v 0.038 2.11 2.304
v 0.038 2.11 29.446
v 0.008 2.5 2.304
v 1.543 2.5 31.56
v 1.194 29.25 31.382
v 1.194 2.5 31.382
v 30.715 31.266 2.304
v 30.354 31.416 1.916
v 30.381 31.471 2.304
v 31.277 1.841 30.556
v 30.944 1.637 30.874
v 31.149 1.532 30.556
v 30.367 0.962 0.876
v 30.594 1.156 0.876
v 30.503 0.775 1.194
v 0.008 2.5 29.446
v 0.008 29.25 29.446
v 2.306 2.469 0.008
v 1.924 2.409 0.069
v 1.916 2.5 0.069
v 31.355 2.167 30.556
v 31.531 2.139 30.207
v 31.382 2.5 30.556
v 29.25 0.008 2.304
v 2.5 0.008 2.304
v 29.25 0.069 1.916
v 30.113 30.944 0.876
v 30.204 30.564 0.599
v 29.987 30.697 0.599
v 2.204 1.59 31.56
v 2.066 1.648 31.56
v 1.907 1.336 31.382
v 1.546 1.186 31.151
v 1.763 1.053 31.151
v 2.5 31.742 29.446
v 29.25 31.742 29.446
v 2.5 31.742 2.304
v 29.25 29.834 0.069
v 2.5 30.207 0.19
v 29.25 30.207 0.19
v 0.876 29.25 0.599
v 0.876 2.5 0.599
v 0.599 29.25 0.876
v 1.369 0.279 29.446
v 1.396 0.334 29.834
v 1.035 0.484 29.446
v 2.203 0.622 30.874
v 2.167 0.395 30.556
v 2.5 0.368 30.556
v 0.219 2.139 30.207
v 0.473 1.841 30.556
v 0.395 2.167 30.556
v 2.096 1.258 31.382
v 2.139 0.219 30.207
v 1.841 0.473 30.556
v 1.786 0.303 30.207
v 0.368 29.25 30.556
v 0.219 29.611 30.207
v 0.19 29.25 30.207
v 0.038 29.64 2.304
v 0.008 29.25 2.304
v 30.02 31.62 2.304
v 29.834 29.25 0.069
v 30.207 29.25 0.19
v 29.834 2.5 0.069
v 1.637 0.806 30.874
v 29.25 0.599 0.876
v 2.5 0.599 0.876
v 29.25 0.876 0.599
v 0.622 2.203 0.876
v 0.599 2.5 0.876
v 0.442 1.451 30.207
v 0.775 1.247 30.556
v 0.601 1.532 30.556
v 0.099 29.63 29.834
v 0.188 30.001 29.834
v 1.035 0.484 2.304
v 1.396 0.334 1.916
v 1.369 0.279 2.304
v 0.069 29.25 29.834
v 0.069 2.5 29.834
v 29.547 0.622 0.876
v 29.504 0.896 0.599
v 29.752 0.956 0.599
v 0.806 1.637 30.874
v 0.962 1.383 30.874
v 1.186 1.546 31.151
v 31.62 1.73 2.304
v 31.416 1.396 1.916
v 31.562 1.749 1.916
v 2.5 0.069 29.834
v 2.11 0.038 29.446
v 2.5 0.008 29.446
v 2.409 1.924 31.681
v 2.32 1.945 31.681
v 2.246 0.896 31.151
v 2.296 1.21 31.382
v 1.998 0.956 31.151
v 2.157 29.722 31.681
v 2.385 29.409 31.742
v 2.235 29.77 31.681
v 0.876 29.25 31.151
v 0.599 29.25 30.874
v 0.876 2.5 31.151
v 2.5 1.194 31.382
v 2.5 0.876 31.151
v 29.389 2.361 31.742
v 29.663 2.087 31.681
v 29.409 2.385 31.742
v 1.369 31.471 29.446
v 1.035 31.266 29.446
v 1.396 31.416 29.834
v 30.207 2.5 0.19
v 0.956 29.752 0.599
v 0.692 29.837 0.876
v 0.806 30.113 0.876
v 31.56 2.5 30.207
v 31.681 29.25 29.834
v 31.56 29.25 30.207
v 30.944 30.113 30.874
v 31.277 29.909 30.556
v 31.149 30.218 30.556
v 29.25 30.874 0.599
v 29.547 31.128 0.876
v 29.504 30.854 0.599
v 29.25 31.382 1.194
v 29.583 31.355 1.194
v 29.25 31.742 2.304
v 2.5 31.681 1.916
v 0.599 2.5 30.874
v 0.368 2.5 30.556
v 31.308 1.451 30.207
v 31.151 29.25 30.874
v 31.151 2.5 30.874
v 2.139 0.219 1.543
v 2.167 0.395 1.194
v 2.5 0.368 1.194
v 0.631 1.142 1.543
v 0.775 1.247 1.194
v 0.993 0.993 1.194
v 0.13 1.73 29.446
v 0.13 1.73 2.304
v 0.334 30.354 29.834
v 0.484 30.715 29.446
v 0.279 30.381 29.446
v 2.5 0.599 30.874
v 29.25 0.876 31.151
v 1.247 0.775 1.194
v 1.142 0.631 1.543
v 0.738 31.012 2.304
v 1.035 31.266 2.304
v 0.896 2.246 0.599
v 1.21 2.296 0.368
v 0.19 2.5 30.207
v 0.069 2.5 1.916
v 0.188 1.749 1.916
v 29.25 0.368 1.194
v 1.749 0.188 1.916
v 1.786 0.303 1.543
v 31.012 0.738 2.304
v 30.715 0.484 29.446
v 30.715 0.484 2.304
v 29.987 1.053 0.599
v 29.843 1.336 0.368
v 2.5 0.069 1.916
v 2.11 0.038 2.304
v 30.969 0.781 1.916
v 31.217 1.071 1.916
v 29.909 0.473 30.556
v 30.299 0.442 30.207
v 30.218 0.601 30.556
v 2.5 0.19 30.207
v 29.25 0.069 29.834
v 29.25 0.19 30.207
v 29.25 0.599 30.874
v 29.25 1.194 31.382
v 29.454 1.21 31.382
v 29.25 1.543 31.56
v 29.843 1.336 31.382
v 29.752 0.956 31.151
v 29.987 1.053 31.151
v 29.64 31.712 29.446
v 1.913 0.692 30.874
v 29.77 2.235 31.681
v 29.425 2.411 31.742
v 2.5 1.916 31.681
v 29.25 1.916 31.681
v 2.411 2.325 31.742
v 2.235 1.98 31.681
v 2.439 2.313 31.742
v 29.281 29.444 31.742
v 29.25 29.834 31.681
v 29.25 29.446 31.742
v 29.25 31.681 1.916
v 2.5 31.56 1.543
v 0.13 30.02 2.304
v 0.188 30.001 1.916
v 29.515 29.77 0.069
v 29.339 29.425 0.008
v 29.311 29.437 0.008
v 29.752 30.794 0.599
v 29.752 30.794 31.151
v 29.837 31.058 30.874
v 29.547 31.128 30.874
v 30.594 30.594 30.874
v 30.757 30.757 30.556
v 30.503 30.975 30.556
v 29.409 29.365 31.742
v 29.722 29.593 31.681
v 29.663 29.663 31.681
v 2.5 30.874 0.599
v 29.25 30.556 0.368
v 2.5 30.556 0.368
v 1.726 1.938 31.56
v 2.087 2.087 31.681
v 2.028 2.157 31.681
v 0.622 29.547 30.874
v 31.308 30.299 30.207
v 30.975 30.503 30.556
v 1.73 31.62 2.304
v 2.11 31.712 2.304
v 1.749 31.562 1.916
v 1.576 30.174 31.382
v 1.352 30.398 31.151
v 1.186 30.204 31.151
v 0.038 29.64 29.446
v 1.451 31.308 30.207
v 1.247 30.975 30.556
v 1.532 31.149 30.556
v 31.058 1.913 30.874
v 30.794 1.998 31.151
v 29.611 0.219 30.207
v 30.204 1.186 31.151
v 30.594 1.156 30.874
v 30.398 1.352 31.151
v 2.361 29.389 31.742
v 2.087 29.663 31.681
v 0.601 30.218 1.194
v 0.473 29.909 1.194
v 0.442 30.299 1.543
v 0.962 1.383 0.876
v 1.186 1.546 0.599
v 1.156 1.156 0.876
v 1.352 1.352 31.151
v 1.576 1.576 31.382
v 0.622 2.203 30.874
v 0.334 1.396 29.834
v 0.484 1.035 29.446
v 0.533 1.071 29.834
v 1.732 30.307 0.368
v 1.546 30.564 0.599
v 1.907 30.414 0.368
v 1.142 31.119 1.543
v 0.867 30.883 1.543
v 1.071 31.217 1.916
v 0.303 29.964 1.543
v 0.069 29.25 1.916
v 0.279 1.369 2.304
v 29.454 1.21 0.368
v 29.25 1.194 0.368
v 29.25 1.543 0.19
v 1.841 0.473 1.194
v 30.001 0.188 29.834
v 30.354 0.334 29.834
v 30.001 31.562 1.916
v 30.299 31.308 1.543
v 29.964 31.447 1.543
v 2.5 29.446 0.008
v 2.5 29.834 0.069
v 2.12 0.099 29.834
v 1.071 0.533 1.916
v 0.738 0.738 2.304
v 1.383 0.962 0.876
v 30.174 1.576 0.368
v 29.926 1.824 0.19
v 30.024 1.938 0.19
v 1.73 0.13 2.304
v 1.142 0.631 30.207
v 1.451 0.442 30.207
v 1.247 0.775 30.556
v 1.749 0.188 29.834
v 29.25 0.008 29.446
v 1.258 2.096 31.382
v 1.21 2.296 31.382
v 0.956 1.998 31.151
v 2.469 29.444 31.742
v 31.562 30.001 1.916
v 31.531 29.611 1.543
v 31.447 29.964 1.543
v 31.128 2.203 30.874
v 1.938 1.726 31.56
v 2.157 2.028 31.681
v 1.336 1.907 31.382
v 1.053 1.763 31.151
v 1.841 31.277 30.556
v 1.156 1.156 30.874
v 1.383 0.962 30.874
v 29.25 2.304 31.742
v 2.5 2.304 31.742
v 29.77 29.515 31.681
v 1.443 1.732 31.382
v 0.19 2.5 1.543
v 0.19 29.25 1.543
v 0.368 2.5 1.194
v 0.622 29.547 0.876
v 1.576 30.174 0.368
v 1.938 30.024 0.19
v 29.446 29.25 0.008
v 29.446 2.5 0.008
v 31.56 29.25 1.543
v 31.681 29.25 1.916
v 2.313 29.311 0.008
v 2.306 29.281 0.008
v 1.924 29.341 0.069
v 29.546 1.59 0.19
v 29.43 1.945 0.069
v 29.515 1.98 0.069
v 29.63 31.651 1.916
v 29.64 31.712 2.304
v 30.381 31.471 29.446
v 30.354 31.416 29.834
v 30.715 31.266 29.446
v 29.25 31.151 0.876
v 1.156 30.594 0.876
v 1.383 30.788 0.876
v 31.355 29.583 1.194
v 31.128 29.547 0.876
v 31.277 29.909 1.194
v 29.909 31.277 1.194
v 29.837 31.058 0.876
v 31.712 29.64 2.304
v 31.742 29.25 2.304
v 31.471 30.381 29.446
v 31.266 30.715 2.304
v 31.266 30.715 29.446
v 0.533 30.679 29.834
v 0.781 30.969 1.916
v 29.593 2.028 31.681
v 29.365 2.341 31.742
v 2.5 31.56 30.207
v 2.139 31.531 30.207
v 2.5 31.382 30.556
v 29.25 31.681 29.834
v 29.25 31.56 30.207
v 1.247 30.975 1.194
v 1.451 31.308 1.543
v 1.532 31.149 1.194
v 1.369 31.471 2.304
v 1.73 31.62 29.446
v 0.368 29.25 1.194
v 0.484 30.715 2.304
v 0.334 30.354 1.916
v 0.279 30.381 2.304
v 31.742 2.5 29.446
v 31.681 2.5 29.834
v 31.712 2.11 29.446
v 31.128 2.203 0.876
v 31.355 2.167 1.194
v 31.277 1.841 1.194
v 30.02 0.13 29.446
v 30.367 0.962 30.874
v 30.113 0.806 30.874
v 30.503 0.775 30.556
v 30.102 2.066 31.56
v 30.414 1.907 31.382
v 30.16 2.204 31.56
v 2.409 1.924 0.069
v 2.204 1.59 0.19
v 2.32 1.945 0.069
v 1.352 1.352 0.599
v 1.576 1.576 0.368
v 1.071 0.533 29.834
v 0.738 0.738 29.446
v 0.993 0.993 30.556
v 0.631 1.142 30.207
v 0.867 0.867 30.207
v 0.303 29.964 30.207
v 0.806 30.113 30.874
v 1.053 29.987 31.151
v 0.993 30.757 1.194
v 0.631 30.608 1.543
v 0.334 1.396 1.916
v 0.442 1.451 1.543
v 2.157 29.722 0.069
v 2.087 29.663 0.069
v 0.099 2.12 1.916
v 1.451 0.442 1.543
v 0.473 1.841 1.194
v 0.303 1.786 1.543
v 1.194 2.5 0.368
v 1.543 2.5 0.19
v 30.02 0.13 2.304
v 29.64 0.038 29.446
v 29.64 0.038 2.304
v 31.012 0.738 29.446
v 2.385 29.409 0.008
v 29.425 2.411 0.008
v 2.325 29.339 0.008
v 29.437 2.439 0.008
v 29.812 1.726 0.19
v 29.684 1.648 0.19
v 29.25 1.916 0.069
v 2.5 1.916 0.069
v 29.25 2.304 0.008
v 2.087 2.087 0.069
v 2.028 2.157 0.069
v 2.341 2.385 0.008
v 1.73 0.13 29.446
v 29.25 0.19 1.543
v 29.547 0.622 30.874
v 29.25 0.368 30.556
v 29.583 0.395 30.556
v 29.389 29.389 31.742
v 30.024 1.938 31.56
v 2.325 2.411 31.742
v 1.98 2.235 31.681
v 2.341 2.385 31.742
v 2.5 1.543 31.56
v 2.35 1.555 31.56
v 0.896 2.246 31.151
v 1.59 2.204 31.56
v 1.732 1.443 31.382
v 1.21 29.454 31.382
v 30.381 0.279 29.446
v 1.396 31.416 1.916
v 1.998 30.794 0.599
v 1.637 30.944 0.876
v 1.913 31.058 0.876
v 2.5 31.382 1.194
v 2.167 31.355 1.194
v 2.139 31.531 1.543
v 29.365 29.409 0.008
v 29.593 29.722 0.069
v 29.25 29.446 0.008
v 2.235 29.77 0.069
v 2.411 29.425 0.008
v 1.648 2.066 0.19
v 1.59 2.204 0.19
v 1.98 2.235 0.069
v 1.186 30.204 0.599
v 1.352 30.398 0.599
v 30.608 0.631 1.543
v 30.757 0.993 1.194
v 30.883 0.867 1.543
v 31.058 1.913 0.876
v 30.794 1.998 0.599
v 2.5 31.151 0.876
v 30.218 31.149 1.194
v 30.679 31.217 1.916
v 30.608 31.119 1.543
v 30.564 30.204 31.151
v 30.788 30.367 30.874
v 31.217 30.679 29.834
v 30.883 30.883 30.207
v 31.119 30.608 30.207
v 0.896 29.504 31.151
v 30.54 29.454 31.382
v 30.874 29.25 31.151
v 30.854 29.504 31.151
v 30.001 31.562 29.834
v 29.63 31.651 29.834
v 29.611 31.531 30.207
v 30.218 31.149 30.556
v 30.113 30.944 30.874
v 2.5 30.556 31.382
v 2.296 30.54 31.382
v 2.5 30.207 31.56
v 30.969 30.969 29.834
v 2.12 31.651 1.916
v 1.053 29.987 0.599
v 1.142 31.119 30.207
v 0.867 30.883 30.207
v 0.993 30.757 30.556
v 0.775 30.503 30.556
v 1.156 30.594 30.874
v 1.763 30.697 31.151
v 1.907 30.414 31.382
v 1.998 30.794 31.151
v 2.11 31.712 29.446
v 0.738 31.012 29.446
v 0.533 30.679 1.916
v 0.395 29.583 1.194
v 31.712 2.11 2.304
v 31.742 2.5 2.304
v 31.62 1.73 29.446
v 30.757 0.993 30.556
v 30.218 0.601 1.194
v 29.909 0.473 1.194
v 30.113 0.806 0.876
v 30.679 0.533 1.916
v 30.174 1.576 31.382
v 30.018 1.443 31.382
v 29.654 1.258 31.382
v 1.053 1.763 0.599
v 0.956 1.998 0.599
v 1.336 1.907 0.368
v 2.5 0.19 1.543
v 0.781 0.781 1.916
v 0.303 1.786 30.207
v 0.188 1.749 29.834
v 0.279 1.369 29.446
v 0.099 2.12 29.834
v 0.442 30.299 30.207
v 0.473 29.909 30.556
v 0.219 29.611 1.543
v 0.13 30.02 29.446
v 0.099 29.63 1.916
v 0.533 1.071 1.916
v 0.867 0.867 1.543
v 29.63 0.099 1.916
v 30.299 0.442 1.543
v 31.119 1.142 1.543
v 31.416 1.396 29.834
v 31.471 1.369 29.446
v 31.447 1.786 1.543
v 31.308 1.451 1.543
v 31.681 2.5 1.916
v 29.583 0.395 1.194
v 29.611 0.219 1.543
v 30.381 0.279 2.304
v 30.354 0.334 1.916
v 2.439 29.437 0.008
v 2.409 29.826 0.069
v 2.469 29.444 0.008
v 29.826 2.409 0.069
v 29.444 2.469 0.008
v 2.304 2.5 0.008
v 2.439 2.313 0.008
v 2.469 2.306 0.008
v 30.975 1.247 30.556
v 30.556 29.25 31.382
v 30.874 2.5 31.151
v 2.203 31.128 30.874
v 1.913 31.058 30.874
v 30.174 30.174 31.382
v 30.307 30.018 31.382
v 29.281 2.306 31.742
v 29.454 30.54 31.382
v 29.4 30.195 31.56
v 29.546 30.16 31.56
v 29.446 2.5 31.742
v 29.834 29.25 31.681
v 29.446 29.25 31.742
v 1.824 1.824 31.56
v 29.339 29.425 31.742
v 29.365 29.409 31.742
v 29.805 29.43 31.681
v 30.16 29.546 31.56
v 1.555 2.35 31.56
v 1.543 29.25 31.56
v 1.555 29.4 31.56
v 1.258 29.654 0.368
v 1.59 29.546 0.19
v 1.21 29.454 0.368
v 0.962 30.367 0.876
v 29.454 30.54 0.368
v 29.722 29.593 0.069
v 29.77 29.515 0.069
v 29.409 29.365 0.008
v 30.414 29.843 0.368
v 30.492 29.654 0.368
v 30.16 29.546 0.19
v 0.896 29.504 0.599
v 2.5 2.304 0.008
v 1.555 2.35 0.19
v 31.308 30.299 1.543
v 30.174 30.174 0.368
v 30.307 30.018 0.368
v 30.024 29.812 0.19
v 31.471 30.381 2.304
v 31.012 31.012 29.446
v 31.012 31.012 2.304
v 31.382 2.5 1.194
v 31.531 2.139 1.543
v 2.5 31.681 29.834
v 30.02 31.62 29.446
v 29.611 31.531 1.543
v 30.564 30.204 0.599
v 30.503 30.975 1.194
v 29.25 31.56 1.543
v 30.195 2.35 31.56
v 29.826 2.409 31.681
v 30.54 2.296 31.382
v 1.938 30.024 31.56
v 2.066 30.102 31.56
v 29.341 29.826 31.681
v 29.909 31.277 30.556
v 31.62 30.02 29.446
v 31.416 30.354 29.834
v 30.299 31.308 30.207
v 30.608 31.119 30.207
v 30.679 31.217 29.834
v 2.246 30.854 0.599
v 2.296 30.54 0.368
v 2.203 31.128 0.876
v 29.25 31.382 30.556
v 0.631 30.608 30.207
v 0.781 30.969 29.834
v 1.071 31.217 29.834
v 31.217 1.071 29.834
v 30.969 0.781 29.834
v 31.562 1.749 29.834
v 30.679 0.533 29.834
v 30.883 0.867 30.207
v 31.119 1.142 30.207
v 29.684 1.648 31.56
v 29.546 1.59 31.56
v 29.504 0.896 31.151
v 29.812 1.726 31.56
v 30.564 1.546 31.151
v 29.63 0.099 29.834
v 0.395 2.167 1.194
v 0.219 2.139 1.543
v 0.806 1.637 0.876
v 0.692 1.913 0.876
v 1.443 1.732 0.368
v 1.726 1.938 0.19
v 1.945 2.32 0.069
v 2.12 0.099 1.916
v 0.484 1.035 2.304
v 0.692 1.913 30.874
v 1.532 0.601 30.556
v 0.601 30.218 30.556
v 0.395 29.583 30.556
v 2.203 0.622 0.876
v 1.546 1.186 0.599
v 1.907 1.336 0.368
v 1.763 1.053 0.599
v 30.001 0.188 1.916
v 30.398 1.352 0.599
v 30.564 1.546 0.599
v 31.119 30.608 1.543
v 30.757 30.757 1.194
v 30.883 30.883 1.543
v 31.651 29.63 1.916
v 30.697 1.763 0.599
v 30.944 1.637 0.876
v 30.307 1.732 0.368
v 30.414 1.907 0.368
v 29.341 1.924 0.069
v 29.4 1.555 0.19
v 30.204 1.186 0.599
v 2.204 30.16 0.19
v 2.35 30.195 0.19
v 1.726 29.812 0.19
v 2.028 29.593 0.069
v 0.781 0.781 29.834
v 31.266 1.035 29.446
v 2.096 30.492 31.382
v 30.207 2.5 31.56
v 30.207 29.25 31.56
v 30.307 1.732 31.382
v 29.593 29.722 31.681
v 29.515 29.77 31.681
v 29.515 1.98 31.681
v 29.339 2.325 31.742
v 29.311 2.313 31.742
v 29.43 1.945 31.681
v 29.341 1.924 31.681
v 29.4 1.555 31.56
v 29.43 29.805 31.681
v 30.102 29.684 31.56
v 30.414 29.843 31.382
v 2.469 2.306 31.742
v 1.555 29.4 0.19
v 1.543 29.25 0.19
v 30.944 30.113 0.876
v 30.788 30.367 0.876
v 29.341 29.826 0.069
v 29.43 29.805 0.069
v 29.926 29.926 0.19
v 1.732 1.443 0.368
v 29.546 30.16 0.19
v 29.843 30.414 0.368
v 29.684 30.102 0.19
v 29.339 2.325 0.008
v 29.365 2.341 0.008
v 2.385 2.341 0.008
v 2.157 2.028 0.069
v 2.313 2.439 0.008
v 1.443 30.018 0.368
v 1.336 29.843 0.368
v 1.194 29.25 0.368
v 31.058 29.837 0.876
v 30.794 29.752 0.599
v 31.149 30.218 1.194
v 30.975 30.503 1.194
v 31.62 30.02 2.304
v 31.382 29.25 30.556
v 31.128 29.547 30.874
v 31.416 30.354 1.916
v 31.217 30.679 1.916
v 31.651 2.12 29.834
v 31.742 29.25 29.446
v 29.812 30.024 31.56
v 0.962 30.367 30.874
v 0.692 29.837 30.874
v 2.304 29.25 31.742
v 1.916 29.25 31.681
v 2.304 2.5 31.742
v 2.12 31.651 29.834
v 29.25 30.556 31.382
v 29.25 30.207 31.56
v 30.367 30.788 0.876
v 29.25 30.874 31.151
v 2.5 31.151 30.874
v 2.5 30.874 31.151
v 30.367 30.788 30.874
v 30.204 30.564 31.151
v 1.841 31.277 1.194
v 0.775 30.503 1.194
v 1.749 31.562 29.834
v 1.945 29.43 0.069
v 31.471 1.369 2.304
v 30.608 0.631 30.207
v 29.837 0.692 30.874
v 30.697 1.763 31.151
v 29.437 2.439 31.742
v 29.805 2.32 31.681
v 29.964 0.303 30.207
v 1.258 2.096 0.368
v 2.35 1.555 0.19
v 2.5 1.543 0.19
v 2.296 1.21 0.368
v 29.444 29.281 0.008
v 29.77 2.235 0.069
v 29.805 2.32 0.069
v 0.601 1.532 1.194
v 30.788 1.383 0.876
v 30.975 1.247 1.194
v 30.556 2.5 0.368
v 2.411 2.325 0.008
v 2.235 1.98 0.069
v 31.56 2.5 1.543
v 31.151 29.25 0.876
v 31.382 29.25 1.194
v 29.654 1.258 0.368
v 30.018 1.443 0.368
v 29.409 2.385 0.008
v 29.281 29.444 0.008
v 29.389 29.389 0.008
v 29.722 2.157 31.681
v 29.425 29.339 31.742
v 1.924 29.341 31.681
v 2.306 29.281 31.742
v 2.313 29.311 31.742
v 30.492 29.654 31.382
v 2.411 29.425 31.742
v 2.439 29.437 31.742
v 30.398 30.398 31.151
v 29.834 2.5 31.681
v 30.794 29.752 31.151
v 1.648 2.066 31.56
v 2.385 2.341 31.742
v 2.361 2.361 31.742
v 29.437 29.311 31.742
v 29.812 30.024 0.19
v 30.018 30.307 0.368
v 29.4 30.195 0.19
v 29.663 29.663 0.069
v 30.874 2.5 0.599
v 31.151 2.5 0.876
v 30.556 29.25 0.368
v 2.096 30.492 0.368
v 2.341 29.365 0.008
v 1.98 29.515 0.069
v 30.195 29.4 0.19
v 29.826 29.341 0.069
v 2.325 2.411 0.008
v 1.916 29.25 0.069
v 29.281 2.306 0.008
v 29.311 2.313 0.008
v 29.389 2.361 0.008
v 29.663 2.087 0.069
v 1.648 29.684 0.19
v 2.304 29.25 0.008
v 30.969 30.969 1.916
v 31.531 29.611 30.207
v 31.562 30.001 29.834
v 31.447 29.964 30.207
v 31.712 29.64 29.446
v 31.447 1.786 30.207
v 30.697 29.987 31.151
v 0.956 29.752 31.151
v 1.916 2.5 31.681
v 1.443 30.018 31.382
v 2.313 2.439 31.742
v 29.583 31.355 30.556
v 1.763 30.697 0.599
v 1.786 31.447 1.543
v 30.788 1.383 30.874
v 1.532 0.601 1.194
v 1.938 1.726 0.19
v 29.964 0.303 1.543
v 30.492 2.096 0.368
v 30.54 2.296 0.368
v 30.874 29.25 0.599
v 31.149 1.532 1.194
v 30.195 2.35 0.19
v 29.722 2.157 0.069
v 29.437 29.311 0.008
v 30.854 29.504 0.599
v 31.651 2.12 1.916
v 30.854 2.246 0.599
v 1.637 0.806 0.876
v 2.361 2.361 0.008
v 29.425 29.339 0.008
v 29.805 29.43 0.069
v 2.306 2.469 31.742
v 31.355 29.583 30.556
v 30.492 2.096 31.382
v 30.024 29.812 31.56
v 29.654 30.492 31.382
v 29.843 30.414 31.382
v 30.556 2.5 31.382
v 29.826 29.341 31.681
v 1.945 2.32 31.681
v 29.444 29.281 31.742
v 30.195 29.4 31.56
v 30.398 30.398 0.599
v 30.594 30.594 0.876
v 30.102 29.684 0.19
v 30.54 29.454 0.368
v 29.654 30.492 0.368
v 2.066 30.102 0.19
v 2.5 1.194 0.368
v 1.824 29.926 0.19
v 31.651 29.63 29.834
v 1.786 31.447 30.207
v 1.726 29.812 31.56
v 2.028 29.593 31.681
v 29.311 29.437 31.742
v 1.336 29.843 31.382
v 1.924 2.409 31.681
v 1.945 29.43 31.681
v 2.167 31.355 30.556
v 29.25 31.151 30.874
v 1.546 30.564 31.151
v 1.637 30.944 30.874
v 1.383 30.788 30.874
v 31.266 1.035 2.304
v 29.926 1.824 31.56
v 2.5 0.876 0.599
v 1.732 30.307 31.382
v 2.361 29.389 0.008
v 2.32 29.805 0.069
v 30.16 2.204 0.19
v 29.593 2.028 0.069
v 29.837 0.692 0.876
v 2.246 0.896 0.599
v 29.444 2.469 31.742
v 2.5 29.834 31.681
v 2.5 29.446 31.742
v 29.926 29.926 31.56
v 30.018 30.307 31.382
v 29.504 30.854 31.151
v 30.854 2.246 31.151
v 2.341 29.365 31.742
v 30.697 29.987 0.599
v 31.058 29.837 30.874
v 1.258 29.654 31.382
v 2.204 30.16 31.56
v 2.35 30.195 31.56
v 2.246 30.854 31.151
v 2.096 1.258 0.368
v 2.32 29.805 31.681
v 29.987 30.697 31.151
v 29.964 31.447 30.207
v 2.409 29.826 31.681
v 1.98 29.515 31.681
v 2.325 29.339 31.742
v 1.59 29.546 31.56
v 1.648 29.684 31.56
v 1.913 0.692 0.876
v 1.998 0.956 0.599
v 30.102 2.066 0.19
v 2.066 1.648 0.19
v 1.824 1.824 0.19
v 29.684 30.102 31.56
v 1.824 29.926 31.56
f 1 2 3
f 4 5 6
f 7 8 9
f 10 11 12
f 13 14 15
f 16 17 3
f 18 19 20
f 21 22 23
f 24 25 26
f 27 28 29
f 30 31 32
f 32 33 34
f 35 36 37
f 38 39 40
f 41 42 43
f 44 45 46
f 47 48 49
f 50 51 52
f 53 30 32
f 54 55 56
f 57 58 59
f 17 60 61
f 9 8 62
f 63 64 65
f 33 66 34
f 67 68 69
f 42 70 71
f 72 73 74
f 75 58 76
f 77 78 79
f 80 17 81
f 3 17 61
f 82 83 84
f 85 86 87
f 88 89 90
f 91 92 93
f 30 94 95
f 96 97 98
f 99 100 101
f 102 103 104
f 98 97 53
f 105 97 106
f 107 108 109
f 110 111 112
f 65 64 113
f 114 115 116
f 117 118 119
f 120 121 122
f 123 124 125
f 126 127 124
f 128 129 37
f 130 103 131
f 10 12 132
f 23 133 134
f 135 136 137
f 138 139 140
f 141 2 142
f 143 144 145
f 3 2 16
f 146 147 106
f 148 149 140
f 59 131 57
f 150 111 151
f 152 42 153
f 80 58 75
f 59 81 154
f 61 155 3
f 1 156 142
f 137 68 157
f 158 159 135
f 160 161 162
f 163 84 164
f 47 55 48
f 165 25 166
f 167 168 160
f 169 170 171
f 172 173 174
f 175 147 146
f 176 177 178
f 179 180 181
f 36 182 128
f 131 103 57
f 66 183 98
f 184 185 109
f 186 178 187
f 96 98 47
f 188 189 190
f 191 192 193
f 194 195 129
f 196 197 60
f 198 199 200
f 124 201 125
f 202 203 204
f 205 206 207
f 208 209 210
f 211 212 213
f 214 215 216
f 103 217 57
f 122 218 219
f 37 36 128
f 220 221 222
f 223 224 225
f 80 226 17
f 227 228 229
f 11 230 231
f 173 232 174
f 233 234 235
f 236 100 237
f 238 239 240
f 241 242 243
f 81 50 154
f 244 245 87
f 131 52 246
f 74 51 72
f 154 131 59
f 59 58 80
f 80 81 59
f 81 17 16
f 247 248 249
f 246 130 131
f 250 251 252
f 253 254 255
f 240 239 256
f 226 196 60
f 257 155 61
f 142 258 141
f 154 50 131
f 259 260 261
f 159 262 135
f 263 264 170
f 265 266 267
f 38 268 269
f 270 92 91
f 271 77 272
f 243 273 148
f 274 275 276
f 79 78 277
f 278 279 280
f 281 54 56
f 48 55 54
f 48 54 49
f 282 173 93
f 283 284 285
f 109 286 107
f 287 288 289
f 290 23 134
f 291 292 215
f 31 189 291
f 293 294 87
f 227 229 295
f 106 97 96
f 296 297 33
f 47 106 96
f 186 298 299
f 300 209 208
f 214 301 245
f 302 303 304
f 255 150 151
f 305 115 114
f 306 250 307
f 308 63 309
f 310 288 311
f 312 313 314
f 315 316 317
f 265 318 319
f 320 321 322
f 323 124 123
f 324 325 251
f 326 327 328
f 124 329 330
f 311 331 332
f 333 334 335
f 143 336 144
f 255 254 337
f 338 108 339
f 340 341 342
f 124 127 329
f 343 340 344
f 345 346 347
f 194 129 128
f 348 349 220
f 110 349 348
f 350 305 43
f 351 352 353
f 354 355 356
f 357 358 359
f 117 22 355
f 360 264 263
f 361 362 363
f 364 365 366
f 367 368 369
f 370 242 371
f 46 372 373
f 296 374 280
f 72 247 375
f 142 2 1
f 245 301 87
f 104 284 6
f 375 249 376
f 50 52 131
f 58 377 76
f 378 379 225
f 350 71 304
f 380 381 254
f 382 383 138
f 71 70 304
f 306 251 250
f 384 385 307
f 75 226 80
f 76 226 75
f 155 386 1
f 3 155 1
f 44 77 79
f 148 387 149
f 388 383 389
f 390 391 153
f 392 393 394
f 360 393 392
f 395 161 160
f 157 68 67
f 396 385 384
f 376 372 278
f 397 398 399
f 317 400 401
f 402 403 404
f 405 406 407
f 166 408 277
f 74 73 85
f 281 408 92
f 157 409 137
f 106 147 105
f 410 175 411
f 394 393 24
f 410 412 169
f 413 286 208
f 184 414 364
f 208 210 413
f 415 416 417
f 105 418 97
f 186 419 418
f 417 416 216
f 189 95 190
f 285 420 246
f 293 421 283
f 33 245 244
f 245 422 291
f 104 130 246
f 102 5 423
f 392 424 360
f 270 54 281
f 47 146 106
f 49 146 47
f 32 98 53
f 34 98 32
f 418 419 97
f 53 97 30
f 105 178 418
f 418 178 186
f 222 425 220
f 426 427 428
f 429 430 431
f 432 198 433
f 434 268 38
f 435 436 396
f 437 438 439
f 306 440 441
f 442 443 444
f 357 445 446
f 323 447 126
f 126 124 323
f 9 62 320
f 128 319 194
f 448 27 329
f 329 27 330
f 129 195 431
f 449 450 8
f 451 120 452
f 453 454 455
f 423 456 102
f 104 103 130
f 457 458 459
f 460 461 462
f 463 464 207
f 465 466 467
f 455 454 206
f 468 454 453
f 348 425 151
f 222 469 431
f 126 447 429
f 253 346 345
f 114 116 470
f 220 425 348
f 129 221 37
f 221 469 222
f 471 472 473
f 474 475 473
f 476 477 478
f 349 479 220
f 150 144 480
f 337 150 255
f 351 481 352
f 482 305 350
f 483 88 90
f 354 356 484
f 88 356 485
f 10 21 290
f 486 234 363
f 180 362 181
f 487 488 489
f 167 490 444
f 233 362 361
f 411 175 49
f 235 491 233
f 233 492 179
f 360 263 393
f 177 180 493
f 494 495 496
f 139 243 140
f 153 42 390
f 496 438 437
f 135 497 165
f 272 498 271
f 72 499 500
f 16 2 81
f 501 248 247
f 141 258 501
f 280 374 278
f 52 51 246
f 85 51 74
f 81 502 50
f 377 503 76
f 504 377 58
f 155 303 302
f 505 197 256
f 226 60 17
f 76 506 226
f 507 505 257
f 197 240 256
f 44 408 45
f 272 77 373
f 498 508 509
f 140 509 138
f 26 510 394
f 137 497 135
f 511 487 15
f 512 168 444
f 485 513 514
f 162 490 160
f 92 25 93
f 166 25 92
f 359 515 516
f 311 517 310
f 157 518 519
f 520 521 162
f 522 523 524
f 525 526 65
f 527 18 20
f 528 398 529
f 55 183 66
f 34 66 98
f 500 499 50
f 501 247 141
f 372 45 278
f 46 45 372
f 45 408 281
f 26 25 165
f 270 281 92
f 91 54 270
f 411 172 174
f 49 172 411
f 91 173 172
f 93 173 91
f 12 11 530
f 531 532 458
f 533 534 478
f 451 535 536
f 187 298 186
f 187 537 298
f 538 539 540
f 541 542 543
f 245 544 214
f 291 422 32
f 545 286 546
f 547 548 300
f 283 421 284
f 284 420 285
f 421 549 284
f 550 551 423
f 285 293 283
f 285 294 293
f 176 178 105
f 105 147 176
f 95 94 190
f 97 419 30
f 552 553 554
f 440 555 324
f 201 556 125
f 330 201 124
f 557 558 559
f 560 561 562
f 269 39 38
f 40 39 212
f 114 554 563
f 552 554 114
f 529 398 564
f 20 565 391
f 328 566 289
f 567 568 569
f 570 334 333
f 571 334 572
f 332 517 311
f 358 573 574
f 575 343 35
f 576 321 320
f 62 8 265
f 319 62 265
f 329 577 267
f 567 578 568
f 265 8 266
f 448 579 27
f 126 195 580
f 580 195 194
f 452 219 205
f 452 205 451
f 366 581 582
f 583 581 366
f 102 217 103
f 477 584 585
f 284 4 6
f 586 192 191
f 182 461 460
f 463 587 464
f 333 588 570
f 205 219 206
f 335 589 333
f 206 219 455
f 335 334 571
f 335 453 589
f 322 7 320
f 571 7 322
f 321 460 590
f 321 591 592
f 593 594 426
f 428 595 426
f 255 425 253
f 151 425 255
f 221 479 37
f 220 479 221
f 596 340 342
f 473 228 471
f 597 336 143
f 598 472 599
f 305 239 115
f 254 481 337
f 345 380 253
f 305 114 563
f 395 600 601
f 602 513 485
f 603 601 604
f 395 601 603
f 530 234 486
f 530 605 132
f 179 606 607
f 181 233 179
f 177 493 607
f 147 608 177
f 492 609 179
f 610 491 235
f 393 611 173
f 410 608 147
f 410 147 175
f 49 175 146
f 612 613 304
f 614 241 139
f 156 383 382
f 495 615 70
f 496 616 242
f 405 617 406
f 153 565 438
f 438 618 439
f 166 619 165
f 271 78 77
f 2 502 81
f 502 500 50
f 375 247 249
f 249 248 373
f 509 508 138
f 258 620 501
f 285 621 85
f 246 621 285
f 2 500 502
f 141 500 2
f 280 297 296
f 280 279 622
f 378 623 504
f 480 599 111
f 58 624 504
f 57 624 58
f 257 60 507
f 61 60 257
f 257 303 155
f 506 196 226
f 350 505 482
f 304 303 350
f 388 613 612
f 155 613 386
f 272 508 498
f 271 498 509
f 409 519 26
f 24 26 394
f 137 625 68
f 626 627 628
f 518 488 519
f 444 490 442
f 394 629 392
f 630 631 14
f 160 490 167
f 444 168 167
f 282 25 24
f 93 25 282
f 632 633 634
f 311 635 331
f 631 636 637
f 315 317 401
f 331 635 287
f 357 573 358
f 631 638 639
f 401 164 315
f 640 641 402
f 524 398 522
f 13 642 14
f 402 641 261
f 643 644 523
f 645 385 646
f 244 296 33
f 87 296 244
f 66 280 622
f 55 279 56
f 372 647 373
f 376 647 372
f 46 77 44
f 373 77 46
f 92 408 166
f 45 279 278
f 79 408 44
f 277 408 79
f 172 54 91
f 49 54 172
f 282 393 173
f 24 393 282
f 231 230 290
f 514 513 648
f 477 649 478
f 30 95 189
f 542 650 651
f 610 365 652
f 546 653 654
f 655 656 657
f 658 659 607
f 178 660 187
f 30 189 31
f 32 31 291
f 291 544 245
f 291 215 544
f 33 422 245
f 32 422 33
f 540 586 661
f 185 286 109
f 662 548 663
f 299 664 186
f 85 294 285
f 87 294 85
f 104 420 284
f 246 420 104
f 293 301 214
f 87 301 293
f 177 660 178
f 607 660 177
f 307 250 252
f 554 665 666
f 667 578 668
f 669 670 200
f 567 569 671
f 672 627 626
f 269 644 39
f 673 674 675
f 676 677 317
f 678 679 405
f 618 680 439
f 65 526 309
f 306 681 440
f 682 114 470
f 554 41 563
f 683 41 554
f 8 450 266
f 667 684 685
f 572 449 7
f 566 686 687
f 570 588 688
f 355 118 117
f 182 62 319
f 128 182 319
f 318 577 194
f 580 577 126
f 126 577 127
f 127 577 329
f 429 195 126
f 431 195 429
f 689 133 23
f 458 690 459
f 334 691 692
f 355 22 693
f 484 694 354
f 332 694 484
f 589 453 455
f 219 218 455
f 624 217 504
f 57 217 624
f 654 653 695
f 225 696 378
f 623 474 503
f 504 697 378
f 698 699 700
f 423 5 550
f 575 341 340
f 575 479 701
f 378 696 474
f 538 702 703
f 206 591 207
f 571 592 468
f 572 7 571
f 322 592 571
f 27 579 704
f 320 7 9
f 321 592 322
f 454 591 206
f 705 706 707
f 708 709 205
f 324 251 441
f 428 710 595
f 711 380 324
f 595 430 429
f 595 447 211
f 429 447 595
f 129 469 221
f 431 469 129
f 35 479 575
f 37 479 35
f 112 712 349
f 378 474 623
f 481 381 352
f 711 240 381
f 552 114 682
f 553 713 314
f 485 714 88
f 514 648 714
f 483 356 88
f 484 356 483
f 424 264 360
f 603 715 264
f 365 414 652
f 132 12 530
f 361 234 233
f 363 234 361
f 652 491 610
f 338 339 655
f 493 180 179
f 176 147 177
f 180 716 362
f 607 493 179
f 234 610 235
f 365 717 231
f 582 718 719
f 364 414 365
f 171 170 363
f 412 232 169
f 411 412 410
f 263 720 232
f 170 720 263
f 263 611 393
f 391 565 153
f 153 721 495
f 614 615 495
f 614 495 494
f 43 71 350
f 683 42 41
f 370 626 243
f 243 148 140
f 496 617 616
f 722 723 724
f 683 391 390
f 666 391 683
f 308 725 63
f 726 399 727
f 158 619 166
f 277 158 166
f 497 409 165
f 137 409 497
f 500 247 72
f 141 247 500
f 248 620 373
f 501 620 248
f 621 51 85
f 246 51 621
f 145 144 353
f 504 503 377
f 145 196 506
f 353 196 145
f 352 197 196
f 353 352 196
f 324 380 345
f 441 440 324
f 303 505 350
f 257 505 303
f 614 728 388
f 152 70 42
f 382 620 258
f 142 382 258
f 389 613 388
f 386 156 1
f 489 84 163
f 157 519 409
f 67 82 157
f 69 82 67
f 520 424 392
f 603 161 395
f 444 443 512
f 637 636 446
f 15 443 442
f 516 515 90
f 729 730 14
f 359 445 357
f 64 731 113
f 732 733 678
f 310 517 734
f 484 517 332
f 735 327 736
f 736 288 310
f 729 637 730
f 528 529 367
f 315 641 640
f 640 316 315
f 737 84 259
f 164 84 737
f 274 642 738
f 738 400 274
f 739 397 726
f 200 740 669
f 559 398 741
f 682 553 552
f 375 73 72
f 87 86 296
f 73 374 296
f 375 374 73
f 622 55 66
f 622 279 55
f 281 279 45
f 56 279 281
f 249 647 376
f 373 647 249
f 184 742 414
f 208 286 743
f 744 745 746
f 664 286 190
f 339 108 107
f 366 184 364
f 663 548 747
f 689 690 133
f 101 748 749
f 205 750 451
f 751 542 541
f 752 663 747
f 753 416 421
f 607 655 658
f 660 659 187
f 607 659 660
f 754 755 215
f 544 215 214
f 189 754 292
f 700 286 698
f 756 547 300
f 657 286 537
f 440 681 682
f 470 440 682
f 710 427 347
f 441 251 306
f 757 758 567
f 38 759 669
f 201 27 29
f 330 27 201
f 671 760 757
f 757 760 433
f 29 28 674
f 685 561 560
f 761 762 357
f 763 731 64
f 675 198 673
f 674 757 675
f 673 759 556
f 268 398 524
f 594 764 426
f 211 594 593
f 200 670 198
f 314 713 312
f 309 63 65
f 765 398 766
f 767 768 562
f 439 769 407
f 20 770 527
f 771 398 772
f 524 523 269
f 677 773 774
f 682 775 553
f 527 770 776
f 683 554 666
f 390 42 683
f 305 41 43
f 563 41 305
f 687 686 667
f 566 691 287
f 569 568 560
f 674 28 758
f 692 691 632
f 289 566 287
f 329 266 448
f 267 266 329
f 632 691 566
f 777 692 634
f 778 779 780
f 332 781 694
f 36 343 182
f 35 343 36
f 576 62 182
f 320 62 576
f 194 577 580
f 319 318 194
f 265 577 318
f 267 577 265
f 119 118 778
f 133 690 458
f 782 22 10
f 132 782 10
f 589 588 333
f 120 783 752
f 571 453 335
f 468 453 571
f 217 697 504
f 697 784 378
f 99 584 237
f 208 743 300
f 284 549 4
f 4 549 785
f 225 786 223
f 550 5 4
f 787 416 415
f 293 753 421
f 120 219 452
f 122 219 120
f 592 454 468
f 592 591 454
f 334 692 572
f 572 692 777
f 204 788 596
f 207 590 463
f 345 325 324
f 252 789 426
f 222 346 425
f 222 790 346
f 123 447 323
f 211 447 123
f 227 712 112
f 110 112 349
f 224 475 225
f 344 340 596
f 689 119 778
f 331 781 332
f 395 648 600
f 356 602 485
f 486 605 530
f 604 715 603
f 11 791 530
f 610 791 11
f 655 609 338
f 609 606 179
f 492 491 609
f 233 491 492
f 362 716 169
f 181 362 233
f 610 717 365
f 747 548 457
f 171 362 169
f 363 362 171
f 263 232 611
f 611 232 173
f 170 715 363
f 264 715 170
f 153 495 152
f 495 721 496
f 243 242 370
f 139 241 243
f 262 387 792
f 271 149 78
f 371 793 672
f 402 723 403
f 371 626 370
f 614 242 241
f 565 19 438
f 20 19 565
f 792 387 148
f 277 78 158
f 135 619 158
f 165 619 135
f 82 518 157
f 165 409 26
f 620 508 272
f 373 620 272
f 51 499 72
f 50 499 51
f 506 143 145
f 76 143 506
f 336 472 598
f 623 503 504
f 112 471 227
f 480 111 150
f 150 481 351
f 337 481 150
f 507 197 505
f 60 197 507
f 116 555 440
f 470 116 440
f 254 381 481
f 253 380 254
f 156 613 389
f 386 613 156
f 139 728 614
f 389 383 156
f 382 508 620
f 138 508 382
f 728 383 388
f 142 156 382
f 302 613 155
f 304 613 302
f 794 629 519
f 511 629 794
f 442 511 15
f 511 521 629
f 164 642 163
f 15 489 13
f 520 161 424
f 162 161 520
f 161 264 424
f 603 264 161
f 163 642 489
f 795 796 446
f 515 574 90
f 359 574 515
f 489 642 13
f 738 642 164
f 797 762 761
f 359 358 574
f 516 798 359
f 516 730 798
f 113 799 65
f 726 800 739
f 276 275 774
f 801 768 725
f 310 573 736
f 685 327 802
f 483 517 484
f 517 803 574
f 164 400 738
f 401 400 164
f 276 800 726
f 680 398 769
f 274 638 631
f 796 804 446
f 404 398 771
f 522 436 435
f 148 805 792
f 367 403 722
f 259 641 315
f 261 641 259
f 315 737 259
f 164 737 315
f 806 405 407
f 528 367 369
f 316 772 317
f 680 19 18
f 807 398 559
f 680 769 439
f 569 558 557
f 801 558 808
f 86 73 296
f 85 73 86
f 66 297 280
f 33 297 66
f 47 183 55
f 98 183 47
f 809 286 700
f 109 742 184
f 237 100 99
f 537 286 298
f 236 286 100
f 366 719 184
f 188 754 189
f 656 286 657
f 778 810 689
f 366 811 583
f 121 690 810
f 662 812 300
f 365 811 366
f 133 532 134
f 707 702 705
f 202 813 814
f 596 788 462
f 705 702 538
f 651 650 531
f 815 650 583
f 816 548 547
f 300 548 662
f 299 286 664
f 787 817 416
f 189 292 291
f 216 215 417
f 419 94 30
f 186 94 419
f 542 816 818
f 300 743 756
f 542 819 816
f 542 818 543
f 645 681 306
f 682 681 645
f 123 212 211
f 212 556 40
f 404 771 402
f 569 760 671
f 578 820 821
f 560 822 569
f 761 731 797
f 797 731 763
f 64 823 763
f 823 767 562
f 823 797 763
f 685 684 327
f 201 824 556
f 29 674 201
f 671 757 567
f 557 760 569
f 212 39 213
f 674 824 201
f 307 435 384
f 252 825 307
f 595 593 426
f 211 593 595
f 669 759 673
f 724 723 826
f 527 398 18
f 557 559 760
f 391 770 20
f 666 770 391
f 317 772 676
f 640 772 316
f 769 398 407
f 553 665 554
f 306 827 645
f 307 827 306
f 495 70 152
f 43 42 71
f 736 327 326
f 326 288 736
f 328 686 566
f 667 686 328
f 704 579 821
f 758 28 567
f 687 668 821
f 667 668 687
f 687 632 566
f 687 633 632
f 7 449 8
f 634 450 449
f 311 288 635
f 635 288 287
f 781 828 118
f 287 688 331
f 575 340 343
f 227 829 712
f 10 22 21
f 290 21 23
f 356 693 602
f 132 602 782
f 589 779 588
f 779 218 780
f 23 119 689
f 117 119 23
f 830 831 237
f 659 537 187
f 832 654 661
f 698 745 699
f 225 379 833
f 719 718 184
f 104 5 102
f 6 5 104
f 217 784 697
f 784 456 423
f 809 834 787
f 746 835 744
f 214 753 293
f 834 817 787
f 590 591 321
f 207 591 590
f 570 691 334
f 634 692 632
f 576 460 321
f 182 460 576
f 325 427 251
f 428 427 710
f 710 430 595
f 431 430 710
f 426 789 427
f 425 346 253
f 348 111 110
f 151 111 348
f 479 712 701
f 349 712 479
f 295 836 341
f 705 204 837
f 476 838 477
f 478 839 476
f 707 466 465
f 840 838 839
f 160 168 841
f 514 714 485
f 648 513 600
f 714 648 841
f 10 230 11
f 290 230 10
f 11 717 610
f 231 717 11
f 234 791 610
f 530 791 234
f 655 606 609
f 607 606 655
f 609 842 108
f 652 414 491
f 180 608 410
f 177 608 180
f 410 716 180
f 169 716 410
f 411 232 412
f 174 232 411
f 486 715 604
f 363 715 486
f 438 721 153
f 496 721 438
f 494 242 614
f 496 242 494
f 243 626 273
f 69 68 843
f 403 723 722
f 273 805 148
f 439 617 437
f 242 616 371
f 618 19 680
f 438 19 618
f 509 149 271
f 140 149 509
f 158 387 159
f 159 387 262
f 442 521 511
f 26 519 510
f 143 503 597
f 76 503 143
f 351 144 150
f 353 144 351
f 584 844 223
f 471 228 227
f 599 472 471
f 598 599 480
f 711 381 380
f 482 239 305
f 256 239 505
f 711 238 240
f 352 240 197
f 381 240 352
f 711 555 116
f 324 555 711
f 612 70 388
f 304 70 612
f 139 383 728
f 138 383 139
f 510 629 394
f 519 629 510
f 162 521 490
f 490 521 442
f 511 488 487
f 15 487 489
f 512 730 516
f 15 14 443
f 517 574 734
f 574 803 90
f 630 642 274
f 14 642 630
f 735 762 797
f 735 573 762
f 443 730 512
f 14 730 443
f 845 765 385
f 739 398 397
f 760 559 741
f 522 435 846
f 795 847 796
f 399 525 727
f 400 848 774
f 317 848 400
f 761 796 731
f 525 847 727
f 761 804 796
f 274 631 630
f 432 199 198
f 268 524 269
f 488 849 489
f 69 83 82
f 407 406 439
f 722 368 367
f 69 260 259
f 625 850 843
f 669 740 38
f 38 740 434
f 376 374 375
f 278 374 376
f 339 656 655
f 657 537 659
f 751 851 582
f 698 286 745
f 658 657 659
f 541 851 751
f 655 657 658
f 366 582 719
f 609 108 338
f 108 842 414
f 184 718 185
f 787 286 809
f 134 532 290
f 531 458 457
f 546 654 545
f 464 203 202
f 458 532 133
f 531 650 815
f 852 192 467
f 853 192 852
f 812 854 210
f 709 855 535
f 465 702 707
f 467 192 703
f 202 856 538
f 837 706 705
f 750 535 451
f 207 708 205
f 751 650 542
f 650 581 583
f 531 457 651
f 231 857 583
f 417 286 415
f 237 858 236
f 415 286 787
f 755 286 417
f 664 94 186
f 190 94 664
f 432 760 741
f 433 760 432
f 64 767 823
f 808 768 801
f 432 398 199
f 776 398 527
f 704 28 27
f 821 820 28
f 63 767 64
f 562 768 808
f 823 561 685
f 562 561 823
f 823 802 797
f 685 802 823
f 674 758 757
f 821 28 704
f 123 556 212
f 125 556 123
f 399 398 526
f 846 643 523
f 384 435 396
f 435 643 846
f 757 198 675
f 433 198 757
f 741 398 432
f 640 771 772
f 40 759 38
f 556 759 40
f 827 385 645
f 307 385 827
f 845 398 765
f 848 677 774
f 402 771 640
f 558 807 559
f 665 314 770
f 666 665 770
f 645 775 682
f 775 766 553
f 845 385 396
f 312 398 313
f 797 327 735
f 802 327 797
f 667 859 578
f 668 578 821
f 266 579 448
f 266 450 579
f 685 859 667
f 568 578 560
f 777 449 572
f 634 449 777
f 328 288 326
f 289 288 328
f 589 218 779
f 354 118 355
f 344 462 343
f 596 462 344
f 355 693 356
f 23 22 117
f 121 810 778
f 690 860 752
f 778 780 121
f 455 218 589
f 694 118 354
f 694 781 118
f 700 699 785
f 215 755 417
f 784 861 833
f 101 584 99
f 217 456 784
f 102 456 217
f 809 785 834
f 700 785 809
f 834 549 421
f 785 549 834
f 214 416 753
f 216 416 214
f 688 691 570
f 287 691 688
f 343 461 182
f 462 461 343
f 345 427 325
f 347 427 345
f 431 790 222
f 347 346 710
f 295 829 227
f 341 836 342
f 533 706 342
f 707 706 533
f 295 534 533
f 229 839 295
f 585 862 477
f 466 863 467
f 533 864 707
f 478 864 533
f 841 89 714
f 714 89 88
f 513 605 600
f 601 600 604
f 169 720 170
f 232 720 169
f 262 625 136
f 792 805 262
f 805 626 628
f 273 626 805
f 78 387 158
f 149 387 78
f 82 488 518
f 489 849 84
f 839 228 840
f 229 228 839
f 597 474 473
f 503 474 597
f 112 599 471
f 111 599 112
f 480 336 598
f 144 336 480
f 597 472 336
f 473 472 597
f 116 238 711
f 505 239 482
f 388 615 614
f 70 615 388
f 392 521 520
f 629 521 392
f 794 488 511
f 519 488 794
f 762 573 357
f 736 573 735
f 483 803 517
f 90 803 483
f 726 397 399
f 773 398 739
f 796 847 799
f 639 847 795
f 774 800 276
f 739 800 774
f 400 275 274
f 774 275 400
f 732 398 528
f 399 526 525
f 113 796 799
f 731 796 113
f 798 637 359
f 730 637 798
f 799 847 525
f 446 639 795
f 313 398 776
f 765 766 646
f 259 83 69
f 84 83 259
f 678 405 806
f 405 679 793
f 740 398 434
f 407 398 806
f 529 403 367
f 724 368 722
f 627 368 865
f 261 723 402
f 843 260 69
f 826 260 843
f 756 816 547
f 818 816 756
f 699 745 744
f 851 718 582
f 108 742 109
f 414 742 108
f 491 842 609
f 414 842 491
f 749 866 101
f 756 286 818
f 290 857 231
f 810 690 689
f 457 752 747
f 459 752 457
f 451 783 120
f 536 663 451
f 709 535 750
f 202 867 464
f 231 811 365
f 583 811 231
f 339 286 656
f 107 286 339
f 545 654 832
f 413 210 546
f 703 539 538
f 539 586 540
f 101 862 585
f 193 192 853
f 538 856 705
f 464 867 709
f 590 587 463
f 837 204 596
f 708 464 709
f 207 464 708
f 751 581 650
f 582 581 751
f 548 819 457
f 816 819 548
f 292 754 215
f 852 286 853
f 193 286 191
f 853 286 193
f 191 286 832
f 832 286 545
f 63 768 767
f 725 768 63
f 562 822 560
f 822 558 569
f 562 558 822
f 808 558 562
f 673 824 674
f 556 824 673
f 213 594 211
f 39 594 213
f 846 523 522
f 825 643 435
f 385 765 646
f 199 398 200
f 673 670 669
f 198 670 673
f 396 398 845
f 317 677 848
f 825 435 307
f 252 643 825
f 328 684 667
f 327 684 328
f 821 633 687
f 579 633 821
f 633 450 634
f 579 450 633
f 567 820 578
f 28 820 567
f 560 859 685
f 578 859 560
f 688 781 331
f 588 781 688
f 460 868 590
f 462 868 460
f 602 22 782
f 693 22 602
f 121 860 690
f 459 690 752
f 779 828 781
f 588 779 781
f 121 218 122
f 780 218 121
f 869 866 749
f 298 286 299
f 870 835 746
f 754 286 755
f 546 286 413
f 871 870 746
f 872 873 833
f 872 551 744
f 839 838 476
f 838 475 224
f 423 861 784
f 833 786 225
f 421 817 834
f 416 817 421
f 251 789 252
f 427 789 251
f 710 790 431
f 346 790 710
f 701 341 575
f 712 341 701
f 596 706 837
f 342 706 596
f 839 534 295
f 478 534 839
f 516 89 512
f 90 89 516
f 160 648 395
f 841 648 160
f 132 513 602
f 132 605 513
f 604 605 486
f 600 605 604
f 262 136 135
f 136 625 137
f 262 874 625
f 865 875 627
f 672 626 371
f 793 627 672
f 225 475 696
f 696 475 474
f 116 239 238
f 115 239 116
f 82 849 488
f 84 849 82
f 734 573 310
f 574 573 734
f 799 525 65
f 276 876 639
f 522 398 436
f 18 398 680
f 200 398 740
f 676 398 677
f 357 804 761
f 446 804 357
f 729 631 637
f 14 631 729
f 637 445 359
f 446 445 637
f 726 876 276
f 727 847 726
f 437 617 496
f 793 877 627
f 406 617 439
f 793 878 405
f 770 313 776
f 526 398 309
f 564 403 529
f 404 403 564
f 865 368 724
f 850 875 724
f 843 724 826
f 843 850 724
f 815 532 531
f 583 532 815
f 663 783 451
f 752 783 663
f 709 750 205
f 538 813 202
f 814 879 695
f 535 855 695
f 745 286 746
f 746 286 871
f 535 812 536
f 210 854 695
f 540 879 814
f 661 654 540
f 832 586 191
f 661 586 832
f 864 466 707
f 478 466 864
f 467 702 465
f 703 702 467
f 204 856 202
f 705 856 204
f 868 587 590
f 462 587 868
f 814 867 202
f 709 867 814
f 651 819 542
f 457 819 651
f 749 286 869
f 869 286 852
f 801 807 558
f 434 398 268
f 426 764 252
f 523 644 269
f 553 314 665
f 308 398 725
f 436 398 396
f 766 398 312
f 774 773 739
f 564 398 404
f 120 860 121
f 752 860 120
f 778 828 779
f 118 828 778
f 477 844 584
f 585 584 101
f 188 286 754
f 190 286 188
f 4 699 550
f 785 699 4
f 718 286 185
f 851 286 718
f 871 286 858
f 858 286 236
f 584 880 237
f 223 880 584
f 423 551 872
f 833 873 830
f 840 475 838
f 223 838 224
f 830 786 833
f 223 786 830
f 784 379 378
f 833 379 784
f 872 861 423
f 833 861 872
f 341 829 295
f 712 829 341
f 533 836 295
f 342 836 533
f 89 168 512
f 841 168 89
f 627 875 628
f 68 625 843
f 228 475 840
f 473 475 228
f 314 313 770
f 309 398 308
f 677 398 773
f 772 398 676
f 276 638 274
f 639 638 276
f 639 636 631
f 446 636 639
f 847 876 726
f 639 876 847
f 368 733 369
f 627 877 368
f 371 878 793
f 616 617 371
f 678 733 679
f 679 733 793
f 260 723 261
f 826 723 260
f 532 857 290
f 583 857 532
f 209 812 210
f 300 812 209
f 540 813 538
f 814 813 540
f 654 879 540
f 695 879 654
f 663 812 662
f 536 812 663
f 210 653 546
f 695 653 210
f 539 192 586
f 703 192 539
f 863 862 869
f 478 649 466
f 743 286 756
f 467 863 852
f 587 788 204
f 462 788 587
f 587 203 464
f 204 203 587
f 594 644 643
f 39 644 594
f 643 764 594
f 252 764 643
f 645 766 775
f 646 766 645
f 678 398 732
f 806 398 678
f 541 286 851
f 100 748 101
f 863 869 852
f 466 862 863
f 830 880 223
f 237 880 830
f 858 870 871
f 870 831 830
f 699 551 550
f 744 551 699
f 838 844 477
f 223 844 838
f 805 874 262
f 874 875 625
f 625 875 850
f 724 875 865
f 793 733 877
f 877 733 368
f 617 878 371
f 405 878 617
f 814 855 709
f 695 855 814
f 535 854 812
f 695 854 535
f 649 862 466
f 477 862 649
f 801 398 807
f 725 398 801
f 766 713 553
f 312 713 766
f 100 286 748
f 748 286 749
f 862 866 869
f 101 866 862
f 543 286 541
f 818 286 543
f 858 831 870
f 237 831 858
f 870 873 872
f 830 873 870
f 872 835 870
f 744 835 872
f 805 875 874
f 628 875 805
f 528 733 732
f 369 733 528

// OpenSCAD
size_in=1.25;
difference() {
  cube([inches(size_in)*2+14,inches(size_in)+10,inches(size_in)+6]);
  translate([2,2,2]) cube([inches(size_in)*2+10,inches(size_in)+6,inches(size_in)+6]);
}
for(x=[0,inches(size_in)+4]) translate([5+x,5])
  !cube2([inches(size_in),inches(size_in),inches(size_in)],2.5,$fn=40);
function inches(in) = 25.4 * in;

module cube2(dims, r=5, $fn=20)
{
  minkowski() {
    translate([r,r,r]) cube([dims[0]-r*2,dims[1]-r*2,dims[2]-r*2]);
    sphere(r=r, $fn=$fn);
  }
}
